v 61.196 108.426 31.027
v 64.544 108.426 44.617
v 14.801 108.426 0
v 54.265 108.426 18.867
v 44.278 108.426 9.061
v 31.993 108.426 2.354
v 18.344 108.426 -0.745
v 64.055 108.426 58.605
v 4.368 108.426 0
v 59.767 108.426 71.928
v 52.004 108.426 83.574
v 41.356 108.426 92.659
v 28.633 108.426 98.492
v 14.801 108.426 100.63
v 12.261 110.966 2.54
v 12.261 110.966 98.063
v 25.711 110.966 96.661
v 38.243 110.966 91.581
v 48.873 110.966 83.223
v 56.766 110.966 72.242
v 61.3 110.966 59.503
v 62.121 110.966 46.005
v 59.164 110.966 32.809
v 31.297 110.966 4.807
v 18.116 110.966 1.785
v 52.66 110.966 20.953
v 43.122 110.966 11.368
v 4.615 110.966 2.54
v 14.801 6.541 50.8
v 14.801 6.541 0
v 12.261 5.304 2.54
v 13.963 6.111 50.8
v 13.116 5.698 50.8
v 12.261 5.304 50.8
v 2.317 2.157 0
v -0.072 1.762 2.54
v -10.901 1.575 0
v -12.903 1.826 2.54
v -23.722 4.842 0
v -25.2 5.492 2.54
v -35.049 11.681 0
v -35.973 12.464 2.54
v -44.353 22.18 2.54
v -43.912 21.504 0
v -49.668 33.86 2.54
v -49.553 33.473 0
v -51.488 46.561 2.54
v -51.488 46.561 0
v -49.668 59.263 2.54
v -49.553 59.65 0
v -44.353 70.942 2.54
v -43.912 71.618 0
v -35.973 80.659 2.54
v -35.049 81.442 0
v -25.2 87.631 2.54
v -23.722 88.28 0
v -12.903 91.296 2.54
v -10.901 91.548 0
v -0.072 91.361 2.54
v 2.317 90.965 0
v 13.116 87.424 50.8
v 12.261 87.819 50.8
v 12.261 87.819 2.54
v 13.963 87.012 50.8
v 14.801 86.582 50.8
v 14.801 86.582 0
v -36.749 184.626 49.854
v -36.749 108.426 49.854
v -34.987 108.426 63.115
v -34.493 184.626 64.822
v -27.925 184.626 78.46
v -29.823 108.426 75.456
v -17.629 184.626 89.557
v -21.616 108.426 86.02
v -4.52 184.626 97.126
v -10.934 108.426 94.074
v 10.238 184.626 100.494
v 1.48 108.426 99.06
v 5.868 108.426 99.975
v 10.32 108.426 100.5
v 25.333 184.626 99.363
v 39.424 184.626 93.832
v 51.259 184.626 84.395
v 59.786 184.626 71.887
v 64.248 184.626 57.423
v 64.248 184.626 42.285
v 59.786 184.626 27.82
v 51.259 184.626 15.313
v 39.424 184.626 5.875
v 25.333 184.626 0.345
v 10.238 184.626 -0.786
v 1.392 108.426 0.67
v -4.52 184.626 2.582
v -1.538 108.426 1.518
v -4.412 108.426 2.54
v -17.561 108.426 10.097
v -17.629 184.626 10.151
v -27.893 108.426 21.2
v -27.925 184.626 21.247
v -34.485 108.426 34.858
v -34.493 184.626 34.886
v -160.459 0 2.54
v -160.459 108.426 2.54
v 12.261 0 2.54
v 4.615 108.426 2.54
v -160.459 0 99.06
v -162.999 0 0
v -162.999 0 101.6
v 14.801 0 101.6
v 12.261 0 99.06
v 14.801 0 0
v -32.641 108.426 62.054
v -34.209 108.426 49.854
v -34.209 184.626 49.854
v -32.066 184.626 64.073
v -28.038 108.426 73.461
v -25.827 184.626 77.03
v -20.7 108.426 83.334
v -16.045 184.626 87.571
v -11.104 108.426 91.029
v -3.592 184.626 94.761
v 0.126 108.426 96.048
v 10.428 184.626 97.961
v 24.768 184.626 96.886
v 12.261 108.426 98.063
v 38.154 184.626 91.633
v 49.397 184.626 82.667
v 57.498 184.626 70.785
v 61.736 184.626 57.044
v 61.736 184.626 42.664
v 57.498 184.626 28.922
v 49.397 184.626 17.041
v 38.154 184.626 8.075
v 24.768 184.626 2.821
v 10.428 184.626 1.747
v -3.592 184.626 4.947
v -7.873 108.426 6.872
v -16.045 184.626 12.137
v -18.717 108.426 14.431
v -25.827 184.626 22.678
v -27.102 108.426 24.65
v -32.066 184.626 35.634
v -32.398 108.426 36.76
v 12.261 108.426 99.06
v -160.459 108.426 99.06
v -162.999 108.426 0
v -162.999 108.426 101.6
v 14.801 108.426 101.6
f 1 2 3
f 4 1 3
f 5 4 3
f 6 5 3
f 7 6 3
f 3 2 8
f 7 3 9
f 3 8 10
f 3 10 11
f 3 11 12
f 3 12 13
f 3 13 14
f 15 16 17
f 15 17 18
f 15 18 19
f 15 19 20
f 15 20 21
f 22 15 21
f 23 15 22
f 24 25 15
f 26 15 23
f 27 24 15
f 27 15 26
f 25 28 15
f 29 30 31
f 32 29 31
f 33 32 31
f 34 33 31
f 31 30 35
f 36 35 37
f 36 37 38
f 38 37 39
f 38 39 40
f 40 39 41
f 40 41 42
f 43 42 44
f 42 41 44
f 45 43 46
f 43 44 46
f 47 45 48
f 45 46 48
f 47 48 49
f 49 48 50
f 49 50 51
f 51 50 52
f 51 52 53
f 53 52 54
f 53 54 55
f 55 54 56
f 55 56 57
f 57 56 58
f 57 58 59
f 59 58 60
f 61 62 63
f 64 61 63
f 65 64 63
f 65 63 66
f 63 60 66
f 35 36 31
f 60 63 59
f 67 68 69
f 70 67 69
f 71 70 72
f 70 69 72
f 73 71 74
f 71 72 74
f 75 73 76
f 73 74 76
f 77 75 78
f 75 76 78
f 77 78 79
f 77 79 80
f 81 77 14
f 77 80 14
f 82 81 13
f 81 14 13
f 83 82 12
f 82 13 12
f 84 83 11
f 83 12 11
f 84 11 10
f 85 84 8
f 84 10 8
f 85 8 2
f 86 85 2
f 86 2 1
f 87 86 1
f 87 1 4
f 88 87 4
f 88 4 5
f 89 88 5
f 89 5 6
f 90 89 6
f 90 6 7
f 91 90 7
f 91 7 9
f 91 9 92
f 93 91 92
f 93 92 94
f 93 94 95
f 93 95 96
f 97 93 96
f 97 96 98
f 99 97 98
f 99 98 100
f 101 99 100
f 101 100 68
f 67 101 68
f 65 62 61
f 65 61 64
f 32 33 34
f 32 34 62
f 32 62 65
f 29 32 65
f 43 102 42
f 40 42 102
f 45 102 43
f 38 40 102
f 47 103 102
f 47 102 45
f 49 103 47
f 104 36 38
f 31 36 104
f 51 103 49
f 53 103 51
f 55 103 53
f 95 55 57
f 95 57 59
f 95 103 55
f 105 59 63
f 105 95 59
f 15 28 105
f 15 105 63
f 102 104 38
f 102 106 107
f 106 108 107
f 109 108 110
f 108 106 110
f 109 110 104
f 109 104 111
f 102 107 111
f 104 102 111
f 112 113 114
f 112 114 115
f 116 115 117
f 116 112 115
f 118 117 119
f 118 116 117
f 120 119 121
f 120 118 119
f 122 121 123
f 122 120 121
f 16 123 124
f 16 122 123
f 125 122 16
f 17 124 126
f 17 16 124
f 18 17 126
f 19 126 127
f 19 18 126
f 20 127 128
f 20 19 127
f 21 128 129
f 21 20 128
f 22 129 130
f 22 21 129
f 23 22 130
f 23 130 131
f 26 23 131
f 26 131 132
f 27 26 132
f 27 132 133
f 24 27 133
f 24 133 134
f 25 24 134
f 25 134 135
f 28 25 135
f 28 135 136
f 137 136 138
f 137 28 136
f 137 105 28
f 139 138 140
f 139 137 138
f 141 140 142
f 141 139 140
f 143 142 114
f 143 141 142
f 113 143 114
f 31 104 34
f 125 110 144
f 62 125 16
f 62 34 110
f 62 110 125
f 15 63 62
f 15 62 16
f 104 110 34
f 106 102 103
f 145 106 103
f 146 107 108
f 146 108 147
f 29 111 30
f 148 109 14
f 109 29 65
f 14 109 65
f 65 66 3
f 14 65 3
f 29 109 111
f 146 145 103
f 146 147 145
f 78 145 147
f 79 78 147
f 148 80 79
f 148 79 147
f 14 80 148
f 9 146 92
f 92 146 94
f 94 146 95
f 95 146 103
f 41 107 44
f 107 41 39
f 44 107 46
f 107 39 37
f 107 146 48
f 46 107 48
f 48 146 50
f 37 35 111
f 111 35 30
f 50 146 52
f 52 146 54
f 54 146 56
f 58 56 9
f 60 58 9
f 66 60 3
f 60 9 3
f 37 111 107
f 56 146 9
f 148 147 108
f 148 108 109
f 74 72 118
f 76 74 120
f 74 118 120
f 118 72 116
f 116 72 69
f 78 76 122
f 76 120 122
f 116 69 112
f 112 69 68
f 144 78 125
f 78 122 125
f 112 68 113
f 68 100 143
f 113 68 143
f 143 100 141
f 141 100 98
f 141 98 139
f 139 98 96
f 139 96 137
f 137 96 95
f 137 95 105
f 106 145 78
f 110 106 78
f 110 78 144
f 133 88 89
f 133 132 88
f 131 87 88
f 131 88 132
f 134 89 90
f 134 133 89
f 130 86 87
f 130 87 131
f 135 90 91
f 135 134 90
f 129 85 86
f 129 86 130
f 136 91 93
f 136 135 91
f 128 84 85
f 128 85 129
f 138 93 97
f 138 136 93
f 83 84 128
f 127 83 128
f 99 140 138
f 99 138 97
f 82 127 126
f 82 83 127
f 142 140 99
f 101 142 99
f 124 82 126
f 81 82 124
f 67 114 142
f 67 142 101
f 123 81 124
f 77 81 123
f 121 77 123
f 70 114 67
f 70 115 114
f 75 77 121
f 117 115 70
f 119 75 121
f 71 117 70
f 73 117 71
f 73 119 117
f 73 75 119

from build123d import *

# Parameters (mm, degrees)
F0_W        = 177.8
F0_H        = 108.4261015058
F1_DEPTH    = 101.6
F2_R        = 50.7821410518
F3_DEPTH    = 76.2
F6_T        = 2.54
F6_T3_DEPTH = 15.513104752
F6_T5_DEPTH = 105.7102081755
F7_R        = 45.225137574
F8_DEPTH    = 50.8


# Not quite as in the source:
# - a feature of the source that left no trace in its solid (it failed there, or was rolled back) is left out
# - a shell that OpenCascade refuses in one call is made with other operations: the cavity is built on its own and cut out


with BuildPart() as f1:
    # F0 (on Top) → F1 (new body)
    with BuildSketch(Plane.XY):
        with Locations((-74.0991531372, 54.2130507529)):
            Rectangle(F0_W, F0_H)
    extrude(amount=F1_DEPTH)

    # F2 (on face) → F3 (join)
    with BuildSketch(Plane(origin=(0, 108.4261015058, 0), x_dir=(-1, 0, 0), z_dir=(0, 1, 0))):
        with Locations((-14.0330018476, 49.8538725078)):
            Circle(F2_R)
    extrude(amount=F3_DEPTH)

    # F6: shell of thickness 2.54, made by hand


with BuildPart() as f6_core1:
    # F6_t2: copy of F1
    add(f1.part)

    # the walls: a layer under each face that stays
    f6_faces = [f6_core1.faces().sort_by_distance(p)[0] for p in [
        (64.8151428994, 146.5261015058, 49.8538725078),
        (-74.0991531372, 54.2130507529, 0),
        (-162.9991531372, 54.2130507529, 50.8),
        (-74.0991531372, 54.2130507529, 101.6),
        (14.8008468628, 54.2130507529, 50.8),
        (34.5914425051, 108.4261015058, 49.8509698158),
    ]]
    thicken(f6_faces, amount=-F6_T, mode=Mode.SUBTRACT)

    # F6_s4 → F6_t3 (cut)
    with BuildSketch(Plane.YZ.offset(1.8277421108)):
        Polygon((108.4007015058, -0.0254), (108.4261015058, 2.54), (110.9661015058, 2.54), (110.9661015058, 0), align=None)
    extrude(amount=F6_T3_DEPTH, mode=Mode.SUBTRACT)

    # F6_s6 → F6_t5 (cut)
    with BuildSketch(Plane.XY.offset(-2.54)):
        Polygon((14.8262468628, 108.4007015058), (12.2608468628, 108.4261015058), (12.2608468628, 110.9661015058), (14.8008468628, 110.9661015058), align=None)
    extrude(amount=F6_T5_DEPTH, mode=Mode.SUBTRACT)


with BuildPart() as f1_1:
    add(f1.part)

    # what is left inside the walls is the cavity
    f6_cavity = [f6_core1.part.solids().sort_by_distance(p)[0] for p in [
        (62.249743, 159.226102, 49.853873),
    ]]
    add(f6_cavity, mode=Mode.SUBTRACT)

    # F7 (on face) → F8 (cut)
    with BuildSketch(Plane(origin=(0, 0, 0), x_dir=(1, 0, 0), z_dir=(0, 0, -1))):
        with Locations((-6.2627755105, -46.561319381)):
            Circle(F7_R)
    extrude(amount=-F8_DEPTH, mode=Mode.SUBTRACT)


solid = f1_1.part
